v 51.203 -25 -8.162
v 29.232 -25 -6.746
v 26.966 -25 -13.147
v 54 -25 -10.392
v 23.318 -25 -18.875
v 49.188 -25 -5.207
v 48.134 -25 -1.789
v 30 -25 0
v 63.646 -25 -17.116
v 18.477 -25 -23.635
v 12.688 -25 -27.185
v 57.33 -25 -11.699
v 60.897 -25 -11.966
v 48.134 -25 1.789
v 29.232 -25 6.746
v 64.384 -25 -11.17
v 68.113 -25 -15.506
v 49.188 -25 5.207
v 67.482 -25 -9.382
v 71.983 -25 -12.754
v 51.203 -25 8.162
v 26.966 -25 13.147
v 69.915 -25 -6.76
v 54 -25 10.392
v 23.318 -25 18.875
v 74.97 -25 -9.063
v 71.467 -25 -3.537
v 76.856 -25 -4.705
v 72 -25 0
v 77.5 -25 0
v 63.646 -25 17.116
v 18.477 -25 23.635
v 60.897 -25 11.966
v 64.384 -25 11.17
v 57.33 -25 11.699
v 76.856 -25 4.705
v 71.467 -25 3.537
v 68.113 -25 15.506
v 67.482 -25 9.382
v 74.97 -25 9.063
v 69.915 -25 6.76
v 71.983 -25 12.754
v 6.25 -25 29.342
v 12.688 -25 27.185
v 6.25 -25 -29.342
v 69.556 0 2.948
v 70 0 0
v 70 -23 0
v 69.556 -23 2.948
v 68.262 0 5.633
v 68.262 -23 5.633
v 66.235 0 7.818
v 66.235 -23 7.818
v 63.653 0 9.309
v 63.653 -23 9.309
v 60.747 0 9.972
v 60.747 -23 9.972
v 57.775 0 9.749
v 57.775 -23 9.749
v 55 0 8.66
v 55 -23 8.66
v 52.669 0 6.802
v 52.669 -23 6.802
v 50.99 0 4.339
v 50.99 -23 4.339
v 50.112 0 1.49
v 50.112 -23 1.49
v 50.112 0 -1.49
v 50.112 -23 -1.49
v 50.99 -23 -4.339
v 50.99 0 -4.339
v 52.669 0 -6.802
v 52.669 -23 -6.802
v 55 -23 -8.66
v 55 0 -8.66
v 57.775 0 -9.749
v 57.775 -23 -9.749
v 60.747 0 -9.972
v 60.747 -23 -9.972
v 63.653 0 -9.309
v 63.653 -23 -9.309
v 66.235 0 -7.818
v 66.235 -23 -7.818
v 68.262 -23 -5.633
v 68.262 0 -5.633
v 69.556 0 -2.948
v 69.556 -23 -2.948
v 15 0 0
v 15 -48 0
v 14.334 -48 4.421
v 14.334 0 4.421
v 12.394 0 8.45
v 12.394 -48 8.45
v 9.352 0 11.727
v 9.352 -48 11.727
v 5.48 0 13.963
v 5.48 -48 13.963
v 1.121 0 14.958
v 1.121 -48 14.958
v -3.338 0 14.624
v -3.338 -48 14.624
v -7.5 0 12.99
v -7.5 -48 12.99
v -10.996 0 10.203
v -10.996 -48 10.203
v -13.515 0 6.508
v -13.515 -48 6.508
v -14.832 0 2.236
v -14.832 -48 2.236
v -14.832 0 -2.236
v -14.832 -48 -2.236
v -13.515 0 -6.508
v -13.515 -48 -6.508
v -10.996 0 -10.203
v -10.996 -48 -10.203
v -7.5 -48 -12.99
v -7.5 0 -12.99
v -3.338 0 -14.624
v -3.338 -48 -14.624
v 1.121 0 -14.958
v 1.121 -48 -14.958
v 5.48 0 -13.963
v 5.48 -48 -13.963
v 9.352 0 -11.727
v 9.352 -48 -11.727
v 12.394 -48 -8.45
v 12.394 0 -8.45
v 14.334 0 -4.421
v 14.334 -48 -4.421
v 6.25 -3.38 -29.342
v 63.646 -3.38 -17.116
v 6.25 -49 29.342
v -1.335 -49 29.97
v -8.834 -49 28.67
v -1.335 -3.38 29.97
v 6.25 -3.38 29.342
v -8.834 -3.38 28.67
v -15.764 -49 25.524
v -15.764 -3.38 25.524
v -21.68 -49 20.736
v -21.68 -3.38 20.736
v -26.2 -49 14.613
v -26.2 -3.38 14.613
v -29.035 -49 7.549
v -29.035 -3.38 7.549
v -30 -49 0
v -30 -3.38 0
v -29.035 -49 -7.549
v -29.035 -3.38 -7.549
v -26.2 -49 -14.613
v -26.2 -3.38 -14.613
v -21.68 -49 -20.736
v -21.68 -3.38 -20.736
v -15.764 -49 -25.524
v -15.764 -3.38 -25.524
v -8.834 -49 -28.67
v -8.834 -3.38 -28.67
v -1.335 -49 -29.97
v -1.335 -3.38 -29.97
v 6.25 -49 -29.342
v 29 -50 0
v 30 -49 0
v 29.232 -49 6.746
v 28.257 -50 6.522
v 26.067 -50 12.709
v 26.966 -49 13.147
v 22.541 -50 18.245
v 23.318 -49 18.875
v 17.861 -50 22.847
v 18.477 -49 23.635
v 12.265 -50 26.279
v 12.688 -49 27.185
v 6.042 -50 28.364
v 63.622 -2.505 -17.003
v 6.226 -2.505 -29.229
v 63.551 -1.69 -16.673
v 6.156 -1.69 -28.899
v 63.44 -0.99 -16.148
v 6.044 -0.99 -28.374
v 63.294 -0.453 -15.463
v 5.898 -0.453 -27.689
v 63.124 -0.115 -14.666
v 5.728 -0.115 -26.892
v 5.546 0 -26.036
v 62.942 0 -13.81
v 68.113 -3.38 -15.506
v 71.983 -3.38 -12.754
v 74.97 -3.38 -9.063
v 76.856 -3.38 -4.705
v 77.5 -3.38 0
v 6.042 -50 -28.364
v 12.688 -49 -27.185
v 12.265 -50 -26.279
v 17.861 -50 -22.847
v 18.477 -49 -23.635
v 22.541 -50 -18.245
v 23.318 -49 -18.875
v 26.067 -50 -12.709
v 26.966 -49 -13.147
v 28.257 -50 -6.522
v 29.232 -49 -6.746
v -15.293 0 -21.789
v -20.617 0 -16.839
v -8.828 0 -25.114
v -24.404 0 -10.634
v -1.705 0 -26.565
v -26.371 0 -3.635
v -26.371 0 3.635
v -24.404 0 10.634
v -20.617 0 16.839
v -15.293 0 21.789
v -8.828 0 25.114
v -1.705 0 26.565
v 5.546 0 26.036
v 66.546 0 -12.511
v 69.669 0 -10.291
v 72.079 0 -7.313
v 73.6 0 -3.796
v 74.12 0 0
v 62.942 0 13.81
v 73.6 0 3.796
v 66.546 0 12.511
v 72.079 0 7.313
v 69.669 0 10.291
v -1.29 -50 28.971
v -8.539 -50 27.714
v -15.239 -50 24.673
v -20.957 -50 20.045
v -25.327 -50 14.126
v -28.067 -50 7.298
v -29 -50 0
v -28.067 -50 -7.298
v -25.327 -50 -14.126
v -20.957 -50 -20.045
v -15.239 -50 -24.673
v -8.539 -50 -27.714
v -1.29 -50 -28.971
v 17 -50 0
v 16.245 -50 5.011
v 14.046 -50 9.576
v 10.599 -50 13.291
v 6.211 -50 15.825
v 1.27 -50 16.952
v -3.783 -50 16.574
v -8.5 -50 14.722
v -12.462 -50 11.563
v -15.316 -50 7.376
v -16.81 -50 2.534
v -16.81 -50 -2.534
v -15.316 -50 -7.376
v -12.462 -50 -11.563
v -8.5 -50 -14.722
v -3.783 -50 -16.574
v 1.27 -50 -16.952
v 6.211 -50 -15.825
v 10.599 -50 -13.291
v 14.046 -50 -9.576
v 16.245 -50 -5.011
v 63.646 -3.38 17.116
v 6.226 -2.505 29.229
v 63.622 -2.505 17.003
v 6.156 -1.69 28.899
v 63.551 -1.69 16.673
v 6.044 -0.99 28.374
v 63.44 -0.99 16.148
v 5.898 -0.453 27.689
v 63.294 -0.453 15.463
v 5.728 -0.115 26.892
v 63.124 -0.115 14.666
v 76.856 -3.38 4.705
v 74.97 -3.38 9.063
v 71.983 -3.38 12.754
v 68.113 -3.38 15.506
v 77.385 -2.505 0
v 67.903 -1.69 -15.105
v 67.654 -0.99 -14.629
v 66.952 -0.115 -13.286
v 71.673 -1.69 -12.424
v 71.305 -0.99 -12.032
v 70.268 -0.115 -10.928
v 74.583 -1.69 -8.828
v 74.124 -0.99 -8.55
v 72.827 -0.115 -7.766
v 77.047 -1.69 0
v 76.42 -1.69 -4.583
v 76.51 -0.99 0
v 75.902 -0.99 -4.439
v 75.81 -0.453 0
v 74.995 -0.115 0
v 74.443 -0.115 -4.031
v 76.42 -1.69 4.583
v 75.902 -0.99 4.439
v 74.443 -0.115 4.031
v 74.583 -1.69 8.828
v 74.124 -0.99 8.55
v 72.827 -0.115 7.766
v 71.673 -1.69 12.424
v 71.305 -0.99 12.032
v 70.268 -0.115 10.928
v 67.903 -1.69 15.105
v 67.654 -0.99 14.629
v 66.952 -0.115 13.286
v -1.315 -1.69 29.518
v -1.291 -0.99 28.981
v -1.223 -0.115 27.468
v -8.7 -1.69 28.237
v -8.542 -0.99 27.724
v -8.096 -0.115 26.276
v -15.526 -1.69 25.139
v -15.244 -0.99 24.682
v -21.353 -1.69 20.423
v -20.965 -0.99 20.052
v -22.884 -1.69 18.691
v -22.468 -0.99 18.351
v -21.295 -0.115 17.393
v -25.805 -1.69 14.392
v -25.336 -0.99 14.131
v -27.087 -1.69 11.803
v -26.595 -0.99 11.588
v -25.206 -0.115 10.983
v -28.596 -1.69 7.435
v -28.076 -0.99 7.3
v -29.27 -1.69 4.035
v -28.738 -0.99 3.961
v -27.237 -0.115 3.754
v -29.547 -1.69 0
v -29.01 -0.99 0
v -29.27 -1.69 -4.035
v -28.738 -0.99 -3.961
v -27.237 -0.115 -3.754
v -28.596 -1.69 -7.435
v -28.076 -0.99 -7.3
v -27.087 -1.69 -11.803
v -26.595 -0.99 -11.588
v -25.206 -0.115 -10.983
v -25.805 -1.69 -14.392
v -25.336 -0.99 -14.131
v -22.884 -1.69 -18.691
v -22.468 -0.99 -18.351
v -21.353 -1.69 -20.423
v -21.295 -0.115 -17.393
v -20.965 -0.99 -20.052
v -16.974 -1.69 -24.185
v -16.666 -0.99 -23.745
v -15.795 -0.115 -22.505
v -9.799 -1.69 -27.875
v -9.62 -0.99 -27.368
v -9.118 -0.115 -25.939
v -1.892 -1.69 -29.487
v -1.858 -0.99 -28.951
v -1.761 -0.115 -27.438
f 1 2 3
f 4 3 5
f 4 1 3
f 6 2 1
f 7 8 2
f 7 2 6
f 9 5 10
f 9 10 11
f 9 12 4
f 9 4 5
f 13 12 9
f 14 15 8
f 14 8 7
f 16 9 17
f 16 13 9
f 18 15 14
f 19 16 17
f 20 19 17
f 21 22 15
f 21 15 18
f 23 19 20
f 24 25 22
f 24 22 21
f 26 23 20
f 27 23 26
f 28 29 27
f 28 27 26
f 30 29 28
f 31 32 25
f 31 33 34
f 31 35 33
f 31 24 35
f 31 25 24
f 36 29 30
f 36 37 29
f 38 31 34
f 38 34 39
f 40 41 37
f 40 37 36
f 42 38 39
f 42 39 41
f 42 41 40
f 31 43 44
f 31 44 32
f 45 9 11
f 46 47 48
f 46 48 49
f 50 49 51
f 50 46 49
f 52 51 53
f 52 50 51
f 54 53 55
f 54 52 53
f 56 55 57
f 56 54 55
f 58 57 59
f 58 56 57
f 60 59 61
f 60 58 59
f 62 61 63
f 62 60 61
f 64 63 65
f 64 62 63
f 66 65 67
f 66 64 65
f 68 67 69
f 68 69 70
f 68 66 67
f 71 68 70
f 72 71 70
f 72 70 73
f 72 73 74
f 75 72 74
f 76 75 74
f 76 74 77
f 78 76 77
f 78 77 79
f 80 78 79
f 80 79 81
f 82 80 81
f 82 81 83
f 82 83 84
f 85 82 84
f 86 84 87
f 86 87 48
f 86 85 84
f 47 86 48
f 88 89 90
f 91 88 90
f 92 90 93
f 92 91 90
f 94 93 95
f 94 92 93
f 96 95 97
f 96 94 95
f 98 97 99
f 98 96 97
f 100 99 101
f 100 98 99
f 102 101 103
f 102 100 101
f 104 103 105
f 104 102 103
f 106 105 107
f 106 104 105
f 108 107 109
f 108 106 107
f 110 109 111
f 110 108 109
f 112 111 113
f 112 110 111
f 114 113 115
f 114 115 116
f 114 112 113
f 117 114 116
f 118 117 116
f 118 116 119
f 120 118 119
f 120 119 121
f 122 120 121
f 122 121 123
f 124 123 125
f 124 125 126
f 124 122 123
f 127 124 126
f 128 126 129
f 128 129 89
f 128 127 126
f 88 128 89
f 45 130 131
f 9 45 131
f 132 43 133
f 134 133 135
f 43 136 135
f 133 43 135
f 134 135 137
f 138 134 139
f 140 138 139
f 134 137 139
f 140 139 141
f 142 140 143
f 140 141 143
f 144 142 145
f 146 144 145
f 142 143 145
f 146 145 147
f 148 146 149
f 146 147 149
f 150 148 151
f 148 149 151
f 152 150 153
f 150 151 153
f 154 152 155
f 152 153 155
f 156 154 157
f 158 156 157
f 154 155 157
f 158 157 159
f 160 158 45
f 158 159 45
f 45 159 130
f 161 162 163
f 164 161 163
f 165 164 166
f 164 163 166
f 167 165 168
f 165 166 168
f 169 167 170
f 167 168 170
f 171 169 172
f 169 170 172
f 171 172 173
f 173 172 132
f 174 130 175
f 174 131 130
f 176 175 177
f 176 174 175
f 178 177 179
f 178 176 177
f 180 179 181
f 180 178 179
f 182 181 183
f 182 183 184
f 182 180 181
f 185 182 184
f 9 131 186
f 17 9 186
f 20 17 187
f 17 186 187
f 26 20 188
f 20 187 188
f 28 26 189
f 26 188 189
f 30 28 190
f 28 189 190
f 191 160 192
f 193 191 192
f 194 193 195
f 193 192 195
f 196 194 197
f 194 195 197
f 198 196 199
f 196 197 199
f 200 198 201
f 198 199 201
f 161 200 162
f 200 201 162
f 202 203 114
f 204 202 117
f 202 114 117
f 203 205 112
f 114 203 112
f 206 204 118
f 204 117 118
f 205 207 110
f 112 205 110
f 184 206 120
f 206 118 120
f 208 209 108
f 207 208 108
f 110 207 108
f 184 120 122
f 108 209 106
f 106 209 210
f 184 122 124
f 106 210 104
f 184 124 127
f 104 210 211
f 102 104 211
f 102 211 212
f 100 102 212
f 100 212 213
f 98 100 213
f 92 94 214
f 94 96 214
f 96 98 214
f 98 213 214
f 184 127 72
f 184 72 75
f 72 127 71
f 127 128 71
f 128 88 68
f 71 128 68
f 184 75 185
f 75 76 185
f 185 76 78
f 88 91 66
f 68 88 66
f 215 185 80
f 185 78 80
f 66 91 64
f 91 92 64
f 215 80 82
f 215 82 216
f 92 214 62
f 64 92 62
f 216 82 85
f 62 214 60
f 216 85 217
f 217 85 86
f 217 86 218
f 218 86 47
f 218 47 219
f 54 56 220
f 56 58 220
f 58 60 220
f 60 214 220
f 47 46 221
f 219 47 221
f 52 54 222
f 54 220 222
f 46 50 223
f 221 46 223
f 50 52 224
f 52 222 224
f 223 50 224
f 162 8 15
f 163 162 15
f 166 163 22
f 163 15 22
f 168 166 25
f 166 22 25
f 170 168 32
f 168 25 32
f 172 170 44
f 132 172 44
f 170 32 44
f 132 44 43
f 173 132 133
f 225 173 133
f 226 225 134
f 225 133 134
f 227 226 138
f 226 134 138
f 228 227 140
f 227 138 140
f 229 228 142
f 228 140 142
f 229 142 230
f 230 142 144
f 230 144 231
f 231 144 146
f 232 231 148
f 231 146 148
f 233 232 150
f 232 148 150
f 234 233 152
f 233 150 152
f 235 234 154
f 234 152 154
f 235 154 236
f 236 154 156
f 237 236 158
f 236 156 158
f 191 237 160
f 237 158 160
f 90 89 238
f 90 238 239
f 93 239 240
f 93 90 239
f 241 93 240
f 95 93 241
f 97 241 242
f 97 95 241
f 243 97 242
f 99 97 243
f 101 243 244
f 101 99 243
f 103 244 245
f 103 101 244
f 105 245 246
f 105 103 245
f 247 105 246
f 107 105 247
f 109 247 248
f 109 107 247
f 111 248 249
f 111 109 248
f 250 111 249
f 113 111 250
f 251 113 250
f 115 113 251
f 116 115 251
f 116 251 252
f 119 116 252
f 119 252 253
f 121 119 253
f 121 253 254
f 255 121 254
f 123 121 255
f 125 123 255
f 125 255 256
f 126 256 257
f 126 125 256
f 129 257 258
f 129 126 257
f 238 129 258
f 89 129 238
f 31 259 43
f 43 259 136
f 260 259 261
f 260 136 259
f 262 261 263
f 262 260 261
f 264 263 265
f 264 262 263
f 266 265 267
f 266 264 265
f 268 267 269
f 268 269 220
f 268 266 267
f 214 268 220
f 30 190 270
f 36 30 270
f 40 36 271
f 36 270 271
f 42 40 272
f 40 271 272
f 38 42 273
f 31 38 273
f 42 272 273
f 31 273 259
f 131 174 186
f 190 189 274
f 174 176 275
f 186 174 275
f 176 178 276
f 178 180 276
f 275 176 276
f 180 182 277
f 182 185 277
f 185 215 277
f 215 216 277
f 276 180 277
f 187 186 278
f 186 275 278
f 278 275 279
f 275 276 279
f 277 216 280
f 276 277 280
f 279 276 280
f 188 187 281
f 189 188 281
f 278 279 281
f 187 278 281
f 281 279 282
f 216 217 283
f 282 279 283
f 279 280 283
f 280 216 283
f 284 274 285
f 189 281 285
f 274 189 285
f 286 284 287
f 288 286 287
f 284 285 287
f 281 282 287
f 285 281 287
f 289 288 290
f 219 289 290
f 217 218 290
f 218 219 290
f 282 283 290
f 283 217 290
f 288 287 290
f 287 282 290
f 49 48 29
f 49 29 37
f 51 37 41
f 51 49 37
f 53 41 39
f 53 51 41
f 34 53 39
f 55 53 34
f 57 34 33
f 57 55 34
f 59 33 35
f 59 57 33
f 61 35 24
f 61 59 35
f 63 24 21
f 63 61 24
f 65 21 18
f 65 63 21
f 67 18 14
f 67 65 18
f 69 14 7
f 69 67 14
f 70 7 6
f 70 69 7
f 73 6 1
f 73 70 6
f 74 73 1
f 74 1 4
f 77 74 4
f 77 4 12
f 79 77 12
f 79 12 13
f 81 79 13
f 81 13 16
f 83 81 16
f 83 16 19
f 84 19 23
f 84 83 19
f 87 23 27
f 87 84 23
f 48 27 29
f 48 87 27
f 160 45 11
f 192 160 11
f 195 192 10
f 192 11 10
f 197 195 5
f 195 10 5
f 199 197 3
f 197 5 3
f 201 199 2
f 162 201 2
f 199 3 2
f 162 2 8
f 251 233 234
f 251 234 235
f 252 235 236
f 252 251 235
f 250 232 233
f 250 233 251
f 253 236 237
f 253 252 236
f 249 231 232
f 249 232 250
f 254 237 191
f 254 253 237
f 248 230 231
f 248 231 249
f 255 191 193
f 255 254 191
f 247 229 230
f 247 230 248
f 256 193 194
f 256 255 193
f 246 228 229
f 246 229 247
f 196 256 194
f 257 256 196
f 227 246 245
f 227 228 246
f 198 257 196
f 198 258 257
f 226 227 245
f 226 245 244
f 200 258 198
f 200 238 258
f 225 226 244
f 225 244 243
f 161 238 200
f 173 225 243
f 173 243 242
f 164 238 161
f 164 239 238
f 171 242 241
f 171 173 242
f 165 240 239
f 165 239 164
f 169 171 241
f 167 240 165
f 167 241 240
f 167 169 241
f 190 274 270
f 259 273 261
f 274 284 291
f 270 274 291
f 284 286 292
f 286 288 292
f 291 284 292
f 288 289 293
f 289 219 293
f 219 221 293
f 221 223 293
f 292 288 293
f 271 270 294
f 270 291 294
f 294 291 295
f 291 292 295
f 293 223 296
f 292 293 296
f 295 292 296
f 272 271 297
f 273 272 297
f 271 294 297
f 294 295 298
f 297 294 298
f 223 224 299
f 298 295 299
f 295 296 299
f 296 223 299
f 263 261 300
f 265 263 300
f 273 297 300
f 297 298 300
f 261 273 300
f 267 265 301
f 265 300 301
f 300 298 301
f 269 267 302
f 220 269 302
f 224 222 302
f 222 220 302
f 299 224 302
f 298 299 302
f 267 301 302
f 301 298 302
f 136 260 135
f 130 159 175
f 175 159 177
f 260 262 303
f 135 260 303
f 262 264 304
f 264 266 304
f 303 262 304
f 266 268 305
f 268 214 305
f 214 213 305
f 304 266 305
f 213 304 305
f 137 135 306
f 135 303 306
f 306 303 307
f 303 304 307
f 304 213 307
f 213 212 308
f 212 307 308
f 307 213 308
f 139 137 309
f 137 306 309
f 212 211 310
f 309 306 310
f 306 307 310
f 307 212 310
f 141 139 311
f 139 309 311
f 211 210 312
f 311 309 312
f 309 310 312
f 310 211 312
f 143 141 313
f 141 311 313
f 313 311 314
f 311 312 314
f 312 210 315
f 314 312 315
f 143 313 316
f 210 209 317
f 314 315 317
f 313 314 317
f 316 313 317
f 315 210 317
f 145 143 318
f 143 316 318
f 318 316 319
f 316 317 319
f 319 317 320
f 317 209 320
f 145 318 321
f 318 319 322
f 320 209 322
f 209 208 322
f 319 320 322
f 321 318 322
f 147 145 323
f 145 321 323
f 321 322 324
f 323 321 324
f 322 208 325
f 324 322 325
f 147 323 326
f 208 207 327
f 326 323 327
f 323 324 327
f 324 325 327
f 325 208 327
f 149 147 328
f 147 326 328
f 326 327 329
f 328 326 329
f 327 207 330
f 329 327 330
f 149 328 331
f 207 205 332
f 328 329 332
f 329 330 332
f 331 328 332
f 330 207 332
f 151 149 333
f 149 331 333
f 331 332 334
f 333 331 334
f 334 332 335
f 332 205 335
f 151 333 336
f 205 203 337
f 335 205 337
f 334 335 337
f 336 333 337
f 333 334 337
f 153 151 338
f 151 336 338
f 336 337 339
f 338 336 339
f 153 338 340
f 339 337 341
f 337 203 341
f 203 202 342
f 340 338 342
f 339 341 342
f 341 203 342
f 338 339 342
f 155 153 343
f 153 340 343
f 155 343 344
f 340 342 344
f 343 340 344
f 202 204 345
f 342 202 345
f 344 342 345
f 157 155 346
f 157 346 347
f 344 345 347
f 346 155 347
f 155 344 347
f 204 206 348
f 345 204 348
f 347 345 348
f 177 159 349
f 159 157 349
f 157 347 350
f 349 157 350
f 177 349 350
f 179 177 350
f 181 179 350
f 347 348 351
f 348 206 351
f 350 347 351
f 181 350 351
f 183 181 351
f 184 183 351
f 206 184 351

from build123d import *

# Parameters (mm, degrees)
F0_R     = 15
F0_R_2   = 10
F1_DEPTH = 25
F2_DEPTH = 50
F3_R     = 3.379899
F4_SIZE  = 2
F5_SIZE  = 1


with BuildPart() as f1:
    # F0 (on Front) → F1 (new body)
    with BuildSketch(Plane.XZ):
        with BuildLine():
            ThreePointArc((6.25, -29.341736), (23.318448, -18.874586), (30, 0))
            ThreePointArc((30, 0), (23.318448, 18.874586), (6.25, 29.341736))
            ThreePointArc((6.25, 29.341736), (-30, 0), (6.25, -29.341736))
        make_face()
        Circle(F0_R, mode=Mode.SUBTRACT)
        with BuildLine():
            ThreePointArc((6.25, 29.341736), (23.318448, 18.874586), (30, 0))
            ThreePointArc((30, 0), (23.318448, -18.874586), (6.25, -29.341736))
            Line((6.25, -29.341736), (63.645833, -17.116013))
            ThreePointArc((63.645833, -17.116013), (42.5, 0), (63.645833, 17.116013))
            Line((63.645833, 17.116013), (6.25, 29.341736))
        make_face()
        with BuildLine():
            ThreePointArc((77.5, 0), (73.602428, 11.010175), (63.645833, 17.116013))
            ThreePointArc((63.645833, 17.116013), (42.5, 0), (63.645833, -17.116013))
            ThreePointArc((63.645833, -17.116013), (73.602428, -11.010175), (77.5, 0))
        make_face()
        with Locations((60, 0)):
            Circle(F0_R_2, mode=Mode.SUBTRACT)
    extrude(amount=F1_DEPTH)

    # F0 (on Front) → F2 (join)
    with BuildSketch(Plane.XZ):
        with BuildLine():
            ThreePointArc((6.25, -29.341736), (23.318448, -18.874586), (30, 0))
            ThreePointArc((30, 0), (23.318448, 18.874586), (6.25, 29.341736))
            ThreePointArc((6.25, 29.341736), (-30, 0), (6.25, -29.341736))
        make_face()
        Circle(F0_R, mode=Mode.SUBTRACT)
    extrude(amount=F2_DEPTH)

    # F3
    f3_edges = [f1.edges().sort_by_distance(p)[0] for p in [
        (-30, 0, 0),
        (34.947917, 0, -23.228875),
        (77.5, 0, 0),
        (34.947917, 0, 23.228875),
    ]]
    fillet(f3_edges, radius=F3_R)

    # F4
    f4_edges = [f1.edges().sort_by_distance(p)[0] for p in [
        (-15, -50, 0),
        (50, -25, 0),
    ]]
    chamfer(f4_edges, length=F4_SIZE)

    # F5
    f5_edges = [f1.edges().sort_by_distance(p)[0] for p in [
        (-6.25, -50, 29.341736),
    ]]
    chamfer(f5_edges, length=F5_SIZE)


solid = f1.part
